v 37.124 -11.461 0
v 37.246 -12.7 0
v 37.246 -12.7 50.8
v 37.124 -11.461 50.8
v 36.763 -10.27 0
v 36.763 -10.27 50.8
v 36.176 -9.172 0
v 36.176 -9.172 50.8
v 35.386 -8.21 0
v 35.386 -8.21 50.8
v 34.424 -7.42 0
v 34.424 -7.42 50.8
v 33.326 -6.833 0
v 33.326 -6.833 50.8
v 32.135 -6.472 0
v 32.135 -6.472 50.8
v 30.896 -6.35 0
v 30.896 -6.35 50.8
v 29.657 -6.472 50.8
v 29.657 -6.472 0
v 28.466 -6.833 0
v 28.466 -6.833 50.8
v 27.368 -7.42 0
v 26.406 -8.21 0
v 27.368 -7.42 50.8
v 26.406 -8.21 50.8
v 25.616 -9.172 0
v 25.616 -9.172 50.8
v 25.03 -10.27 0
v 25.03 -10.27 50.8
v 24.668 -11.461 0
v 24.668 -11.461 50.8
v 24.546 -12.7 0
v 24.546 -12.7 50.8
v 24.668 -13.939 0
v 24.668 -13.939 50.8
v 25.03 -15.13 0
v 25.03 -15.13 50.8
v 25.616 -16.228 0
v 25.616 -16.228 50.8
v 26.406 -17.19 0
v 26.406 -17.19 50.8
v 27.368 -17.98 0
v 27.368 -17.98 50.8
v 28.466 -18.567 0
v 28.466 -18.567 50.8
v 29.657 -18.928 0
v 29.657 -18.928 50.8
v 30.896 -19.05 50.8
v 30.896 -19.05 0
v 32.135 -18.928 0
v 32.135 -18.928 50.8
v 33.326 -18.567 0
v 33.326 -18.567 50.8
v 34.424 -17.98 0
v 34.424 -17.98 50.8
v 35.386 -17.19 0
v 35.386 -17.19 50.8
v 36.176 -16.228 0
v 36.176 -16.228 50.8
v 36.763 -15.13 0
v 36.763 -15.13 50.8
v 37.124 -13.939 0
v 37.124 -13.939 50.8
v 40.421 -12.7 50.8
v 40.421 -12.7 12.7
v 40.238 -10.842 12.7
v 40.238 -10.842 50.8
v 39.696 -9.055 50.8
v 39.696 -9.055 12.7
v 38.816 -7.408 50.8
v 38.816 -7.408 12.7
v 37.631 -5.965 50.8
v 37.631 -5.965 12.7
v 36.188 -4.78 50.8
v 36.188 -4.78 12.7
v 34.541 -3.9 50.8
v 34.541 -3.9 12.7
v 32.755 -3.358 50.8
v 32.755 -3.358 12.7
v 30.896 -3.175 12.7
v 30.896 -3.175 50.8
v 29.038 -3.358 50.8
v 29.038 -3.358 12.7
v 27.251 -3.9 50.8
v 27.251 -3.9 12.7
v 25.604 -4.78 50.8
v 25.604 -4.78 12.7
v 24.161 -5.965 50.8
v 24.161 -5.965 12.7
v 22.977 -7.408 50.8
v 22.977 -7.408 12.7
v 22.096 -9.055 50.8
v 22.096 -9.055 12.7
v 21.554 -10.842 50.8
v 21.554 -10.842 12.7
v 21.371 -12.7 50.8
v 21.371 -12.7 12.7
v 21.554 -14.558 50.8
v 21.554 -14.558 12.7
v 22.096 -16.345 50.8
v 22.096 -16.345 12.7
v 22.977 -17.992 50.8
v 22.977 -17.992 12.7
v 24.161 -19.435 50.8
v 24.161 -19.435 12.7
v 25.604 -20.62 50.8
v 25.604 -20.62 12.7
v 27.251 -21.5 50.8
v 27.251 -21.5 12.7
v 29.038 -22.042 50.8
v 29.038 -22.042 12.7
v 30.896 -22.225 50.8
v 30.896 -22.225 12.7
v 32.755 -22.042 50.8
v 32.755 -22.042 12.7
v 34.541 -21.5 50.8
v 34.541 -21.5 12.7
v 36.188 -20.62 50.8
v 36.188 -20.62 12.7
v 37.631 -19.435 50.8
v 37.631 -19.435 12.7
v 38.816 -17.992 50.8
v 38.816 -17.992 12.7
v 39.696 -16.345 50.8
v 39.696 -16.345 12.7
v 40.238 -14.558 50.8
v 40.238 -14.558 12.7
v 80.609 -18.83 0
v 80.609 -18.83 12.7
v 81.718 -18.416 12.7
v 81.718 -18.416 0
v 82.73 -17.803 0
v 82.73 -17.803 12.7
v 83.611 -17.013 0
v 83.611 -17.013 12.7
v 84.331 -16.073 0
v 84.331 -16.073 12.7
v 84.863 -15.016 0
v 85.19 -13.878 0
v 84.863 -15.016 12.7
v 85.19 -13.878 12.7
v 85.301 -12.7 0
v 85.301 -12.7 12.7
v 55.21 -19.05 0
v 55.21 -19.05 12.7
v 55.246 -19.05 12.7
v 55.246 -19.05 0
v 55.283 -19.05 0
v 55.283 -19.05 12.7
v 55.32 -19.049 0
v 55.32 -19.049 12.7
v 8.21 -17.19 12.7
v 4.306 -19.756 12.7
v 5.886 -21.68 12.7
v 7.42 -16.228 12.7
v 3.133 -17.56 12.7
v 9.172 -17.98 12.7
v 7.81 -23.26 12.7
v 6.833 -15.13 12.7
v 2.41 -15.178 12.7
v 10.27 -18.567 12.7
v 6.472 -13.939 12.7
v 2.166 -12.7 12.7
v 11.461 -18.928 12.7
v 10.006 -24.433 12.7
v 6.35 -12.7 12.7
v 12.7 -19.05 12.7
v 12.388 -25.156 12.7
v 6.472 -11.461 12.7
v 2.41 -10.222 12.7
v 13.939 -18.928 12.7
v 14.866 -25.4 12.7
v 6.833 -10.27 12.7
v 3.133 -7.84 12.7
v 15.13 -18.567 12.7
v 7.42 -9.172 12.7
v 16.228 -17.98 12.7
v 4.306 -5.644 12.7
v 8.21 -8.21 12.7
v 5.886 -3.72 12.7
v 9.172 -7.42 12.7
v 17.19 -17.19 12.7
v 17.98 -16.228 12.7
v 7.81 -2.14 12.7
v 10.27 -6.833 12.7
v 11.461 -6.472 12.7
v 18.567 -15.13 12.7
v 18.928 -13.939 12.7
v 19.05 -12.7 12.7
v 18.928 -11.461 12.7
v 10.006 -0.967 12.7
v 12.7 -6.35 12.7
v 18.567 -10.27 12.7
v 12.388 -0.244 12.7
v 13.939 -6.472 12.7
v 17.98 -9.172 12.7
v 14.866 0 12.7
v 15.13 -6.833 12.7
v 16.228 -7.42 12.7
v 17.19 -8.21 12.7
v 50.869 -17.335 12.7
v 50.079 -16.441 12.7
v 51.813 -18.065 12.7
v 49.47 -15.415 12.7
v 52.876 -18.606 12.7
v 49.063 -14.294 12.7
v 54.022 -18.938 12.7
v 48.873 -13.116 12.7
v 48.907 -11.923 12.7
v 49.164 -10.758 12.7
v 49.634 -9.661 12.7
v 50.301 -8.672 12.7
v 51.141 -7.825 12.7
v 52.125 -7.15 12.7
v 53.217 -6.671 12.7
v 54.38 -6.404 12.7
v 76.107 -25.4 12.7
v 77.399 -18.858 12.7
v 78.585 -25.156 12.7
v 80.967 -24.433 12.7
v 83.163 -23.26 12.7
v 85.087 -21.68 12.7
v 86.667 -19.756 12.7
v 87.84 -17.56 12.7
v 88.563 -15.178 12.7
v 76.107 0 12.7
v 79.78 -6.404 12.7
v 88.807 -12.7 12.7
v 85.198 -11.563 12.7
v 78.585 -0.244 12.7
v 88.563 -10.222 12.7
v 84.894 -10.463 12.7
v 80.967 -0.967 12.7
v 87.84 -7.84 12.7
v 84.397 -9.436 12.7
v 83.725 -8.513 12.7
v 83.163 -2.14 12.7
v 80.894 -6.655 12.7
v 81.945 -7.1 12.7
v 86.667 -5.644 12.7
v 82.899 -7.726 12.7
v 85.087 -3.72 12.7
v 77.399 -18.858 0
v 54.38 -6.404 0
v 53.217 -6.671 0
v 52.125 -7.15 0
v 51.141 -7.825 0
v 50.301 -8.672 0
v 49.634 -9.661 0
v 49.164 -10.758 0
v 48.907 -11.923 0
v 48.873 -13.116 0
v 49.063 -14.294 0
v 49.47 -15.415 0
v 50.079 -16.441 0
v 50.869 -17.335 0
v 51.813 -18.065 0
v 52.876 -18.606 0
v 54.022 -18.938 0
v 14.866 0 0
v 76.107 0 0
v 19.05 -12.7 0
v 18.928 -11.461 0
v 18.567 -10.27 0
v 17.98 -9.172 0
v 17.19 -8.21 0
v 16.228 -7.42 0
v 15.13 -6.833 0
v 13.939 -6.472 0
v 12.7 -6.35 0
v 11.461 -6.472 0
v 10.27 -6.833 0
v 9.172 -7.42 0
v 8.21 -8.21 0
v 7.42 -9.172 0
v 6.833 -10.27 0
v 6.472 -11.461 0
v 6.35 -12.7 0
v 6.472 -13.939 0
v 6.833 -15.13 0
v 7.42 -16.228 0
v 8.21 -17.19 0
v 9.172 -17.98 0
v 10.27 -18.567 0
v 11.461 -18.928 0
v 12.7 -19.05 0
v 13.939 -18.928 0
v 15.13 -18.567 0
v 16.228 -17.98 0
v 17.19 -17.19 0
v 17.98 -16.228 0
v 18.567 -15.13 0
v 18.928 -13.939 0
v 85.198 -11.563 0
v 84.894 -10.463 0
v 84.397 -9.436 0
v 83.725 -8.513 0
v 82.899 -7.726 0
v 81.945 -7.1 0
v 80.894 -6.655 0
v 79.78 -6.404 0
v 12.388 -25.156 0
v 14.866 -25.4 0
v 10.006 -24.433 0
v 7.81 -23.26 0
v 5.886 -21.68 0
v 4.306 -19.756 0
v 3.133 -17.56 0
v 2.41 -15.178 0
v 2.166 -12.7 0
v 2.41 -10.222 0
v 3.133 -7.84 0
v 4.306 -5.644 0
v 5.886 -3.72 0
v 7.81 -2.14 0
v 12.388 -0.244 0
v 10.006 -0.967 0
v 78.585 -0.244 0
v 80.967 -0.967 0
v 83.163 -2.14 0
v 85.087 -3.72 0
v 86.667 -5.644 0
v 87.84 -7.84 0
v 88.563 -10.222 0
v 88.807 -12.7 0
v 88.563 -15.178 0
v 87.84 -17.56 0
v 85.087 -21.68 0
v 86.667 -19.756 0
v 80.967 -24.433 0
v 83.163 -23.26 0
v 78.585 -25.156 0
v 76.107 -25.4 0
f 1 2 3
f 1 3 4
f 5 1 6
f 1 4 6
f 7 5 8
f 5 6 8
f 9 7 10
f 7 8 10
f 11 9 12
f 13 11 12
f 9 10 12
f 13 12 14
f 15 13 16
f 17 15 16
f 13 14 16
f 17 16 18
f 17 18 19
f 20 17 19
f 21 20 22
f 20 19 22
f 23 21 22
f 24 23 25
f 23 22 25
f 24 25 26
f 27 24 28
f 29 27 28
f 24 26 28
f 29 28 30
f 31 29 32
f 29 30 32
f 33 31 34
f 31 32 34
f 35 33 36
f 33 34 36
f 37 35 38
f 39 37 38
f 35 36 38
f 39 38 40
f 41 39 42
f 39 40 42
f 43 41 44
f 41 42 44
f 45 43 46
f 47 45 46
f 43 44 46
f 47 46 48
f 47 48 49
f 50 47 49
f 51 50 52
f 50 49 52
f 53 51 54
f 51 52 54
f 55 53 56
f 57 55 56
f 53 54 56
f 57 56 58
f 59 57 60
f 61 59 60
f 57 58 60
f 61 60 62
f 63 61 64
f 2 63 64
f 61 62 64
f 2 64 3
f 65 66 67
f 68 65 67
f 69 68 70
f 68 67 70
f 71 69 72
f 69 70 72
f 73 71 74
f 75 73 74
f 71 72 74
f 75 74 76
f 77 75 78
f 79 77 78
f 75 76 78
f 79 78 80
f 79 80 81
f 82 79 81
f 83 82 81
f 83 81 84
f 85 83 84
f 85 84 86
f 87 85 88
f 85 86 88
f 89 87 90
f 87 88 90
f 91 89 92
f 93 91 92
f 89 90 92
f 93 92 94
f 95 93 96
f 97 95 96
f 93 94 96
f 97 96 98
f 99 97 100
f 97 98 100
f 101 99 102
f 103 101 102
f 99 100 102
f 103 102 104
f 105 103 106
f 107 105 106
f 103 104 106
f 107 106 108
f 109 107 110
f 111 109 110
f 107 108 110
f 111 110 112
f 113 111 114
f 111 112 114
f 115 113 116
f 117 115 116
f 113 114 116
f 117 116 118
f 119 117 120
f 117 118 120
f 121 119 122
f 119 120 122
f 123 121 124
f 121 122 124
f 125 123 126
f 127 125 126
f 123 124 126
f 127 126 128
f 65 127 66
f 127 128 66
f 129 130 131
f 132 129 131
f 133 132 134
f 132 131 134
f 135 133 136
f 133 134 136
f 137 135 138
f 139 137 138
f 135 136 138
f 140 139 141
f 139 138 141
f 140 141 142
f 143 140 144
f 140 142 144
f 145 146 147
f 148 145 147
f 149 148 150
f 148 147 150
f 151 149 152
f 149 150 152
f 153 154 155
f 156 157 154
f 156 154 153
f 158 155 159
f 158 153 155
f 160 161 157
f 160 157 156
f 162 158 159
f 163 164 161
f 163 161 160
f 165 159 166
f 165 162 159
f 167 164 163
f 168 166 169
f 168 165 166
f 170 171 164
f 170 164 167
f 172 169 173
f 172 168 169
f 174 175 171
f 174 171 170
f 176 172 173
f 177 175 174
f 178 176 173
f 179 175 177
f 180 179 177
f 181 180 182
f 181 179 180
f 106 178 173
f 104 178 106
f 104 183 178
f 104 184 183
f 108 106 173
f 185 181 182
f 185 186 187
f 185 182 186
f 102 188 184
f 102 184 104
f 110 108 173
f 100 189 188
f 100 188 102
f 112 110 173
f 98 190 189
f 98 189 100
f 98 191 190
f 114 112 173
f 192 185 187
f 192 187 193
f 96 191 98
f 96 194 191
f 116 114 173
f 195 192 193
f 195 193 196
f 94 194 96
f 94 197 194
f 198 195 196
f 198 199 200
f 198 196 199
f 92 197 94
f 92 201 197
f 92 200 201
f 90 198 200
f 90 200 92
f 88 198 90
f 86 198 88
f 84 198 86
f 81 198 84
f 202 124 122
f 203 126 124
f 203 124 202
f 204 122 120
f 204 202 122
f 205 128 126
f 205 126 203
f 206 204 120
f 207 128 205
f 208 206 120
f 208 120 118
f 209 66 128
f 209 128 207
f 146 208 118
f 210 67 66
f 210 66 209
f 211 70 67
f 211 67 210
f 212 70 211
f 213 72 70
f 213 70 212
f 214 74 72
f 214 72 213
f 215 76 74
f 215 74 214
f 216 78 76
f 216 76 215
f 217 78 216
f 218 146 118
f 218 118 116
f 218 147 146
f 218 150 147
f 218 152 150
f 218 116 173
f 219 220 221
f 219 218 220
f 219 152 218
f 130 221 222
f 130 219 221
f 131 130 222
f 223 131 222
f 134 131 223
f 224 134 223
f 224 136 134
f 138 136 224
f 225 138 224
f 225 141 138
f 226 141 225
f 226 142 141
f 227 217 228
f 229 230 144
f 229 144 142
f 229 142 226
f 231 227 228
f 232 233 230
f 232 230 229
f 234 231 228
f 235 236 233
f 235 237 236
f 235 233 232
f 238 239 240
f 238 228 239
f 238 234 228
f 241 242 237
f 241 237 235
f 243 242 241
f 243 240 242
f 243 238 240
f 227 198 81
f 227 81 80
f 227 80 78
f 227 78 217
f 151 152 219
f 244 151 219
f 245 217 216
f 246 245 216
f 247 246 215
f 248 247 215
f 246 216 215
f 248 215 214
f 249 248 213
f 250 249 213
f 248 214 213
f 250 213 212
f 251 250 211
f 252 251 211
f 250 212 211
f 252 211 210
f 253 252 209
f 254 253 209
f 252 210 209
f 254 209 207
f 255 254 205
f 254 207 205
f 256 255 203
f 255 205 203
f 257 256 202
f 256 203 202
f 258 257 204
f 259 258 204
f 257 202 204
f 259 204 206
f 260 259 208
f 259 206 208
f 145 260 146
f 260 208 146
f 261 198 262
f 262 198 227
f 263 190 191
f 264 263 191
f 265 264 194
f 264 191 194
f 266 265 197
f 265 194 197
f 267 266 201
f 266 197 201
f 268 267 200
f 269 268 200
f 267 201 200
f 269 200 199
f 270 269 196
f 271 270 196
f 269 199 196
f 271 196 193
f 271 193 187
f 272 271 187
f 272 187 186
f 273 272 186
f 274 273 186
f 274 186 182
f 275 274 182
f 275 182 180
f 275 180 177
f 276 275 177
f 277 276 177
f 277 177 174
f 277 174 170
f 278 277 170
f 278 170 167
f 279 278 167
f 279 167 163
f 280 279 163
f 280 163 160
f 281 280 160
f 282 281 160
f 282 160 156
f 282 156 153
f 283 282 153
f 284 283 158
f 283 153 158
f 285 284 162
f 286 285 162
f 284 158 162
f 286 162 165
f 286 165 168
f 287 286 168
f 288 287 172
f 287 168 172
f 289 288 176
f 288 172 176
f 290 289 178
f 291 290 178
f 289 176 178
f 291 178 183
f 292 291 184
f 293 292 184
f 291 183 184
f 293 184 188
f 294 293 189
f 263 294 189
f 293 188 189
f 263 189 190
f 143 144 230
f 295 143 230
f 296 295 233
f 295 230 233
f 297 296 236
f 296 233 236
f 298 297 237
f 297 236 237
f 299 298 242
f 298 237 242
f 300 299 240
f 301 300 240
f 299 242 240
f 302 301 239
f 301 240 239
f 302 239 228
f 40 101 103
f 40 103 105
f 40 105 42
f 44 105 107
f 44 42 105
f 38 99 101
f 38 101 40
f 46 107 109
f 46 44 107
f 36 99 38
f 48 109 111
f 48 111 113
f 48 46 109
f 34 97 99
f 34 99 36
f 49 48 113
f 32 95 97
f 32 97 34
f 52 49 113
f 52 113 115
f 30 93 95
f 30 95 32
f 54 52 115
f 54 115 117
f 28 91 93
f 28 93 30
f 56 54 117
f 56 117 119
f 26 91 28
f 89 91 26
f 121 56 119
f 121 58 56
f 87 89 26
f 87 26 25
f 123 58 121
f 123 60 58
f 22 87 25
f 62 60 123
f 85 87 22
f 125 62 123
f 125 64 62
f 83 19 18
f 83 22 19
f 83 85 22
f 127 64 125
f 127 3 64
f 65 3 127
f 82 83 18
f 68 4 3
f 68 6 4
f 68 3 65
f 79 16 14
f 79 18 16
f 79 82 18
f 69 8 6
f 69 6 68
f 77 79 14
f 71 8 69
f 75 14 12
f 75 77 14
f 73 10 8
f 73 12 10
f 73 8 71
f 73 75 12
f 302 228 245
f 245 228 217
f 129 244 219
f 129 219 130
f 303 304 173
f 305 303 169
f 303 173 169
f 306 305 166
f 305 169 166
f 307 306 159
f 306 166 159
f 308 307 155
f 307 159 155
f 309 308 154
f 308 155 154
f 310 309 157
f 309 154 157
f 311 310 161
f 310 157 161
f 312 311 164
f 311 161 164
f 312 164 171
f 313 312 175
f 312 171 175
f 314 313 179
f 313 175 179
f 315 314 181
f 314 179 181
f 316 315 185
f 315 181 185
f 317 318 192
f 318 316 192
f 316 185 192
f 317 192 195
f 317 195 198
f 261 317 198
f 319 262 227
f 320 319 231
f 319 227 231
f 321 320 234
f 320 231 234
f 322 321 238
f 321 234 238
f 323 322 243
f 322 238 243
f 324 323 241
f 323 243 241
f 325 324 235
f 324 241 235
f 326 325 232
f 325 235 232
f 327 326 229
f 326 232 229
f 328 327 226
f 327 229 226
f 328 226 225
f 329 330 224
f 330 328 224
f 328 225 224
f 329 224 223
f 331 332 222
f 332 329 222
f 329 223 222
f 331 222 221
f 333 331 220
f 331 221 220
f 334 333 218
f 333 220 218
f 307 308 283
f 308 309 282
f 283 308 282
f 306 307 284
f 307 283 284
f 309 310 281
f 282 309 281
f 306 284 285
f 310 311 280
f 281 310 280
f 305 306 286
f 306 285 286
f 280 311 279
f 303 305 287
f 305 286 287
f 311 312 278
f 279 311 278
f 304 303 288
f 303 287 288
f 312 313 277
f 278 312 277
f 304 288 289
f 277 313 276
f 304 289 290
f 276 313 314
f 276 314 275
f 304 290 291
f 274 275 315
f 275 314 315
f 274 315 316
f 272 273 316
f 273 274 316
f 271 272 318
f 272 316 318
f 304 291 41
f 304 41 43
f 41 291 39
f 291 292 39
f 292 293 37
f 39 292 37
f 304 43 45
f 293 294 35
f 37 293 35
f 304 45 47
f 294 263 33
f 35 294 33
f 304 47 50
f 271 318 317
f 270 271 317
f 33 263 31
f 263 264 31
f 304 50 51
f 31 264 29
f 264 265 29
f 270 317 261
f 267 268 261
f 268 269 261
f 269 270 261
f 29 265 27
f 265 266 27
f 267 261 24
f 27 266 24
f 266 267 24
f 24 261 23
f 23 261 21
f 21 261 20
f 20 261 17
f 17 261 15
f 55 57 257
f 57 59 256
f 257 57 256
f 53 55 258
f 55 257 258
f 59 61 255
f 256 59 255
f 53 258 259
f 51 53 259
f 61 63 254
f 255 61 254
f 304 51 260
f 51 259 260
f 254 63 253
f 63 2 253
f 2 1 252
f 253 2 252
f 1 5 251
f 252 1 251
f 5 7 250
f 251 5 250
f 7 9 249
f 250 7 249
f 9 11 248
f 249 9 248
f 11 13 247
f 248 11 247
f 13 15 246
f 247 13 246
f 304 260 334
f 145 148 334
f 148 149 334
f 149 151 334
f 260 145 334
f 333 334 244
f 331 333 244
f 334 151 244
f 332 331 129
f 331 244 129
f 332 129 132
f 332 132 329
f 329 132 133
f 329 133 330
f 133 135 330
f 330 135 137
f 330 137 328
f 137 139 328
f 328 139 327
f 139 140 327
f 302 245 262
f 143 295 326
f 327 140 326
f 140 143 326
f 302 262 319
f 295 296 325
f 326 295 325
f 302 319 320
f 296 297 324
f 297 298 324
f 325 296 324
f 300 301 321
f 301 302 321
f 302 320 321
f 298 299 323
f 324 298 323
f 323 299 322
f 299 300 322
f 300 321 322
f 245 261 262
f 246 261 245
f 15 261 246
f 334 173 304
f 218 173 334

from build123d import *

# Parameters (mm, degrees)
F0_W      = 101.6
F0_H      = 12.7
F1_DEPTH  = 25.4
F2_R      = 6.35
F3_DEPTH  = 25.4
F4_R      = 9.525
F5_DEPTH  = 38.1
F6_R      = 6.35
F7_DEPTH  = 50.8
F9_DEPTH  = 25.4
F11_DEPTH = 25.4
F13_DEPTH = 25.4


with BuildPart() as f1:
    # F0 (on Front) → F1 (new body)
    with BuildSketch(Plane.XZ):
        with Locations((50.8, 6.35)):
            Rectangle(F0_W, F0_H)
    extrude(amount=F1_DEPTH)

    # F2 (on face) → F3 (cut)
    with BuildSketch(Plane.XY.offset(12.7)):
        with Locations((12.7, -12.7)):
            Circle(F2_R)
    extrude(amount=-F3_DEPTH, mode=Mode.SUBTRACT)

    # F4 (on face) → F5 (join)
    with BuildSketch(Plane.XY.offset(12.7)):
        with Locations((30.8962874115, -12.7)):
            Circle(F4_R)
    extrude(amount=F5_DEPTH)

    # F6 (on face) → F7 (cut)
    with BuildSketch(Plane.XY.offset(50.8)):
        with Locations((30.8962874115, -12.7)):
            Circle(F6_R)
    extrude(amount=-F7_DEPTH, mode=Mode.SUBTRACT)

    # F8 (on face) → F9 (cut)
    with BuildSketch(Plane.XY.offset(12.7)):
        with BuildLine():
            ThreePointArc((61.5597656887, -12.7), (59.6998937492, -17.1901280605), (55.2097656887, -19.05))
            Line((55.2097656887, -19.05), (77.399272464, -18.8575478586))
            ThreePointArc((77.399272464, -18.8575478586), (72.6114019876, -12.3324709451), (78.1212527055, -6.4044124523))
            Line((78.1212527055, -6.4044124523), (56.0392700164, -6.4044124523))
            ThreePointArc((56.0392700164, -6.4044124523), (59.9841689227, -8.5134054699), (61.5597656887, -12.7))
        make_face()
        with BuildLine():
            Line((56.0392700164, -6.4044124523), (54.3802613609, -6.4044124523))
            ThreePointArc((54.3802613609, -6.4044124523), (48.8733834035, -13.1156435206), (55.2097656887, -19.05))
            ThreePointArc((55.2097656887, -19.05), (59.6998937492, -17.1901280605), (61.5597656887, -12.7))
            ThreePointArc((61.5597656887, -12.7), (59.9841689227, -8.5134054699), (56.0392700164, -6.4044124523))
        make_face()
        with BuildLine():
            ThreePointArc((78.1212527055, -6.4044124523), (72.6114019876, -12.3324709451), (77.399272464, -18.8575478586))
            Line((77.399272464, -18.8575478586), (80.6088104115, -18.8297111673))
            ThreePointArc((80.6088104115, -18.8297111673), (83.9931343967, -16.5596541975), (85.3007570332, -12.7))
            ThreePointArc((85.3007570332, -12.7), (83.7251602672, -8.5134054699), (79.7802613609, -6.4044124523))
            Line((79.7802613609, -6.4044124523), (78.1212527055, -6.4044124523))
        make_face()
    extrude(amount=-F9_DEPTH, mode=Mode.SUBTRACT)

    # F10 (on face) → F11 (cut)
    with BuildSketch(Plane.XY.offset(12.7)):
        with BuildLine():
            ThreePointArc((76.106920933, 0), (88.806920933, -12.7), (76.106920933, -25.4))
            Line((76.106920933, -25.4), (101.6, -25.4))
            Line((101.6, -25.4), (101.6, 0))
            Line((101.6, 0), (76.106920933, 0))
        make_face()
    extrude(amount=-F11_DEPTH, mode=Mode.SUBTRACT)

    # F12 (on face) → F13 (cut)
    with BuildSketch(Plane.XY.offset(12.7)):
        with BuildLine():
            ThreePointArc((14.8660039439, -25.4), (2.1660039439, -12.7), (14.8660039439, 0))
            Line((14.8660039439, 0), (0, 0))
            Line((0, 0), (0, -25.4))
            Line((0, -25.4), (14.8660039439, -25.4))
        make_face()
    extrude(amount=-F13_DEPTH, mode=Mode.SUBTRACT)


solid = f1.part
